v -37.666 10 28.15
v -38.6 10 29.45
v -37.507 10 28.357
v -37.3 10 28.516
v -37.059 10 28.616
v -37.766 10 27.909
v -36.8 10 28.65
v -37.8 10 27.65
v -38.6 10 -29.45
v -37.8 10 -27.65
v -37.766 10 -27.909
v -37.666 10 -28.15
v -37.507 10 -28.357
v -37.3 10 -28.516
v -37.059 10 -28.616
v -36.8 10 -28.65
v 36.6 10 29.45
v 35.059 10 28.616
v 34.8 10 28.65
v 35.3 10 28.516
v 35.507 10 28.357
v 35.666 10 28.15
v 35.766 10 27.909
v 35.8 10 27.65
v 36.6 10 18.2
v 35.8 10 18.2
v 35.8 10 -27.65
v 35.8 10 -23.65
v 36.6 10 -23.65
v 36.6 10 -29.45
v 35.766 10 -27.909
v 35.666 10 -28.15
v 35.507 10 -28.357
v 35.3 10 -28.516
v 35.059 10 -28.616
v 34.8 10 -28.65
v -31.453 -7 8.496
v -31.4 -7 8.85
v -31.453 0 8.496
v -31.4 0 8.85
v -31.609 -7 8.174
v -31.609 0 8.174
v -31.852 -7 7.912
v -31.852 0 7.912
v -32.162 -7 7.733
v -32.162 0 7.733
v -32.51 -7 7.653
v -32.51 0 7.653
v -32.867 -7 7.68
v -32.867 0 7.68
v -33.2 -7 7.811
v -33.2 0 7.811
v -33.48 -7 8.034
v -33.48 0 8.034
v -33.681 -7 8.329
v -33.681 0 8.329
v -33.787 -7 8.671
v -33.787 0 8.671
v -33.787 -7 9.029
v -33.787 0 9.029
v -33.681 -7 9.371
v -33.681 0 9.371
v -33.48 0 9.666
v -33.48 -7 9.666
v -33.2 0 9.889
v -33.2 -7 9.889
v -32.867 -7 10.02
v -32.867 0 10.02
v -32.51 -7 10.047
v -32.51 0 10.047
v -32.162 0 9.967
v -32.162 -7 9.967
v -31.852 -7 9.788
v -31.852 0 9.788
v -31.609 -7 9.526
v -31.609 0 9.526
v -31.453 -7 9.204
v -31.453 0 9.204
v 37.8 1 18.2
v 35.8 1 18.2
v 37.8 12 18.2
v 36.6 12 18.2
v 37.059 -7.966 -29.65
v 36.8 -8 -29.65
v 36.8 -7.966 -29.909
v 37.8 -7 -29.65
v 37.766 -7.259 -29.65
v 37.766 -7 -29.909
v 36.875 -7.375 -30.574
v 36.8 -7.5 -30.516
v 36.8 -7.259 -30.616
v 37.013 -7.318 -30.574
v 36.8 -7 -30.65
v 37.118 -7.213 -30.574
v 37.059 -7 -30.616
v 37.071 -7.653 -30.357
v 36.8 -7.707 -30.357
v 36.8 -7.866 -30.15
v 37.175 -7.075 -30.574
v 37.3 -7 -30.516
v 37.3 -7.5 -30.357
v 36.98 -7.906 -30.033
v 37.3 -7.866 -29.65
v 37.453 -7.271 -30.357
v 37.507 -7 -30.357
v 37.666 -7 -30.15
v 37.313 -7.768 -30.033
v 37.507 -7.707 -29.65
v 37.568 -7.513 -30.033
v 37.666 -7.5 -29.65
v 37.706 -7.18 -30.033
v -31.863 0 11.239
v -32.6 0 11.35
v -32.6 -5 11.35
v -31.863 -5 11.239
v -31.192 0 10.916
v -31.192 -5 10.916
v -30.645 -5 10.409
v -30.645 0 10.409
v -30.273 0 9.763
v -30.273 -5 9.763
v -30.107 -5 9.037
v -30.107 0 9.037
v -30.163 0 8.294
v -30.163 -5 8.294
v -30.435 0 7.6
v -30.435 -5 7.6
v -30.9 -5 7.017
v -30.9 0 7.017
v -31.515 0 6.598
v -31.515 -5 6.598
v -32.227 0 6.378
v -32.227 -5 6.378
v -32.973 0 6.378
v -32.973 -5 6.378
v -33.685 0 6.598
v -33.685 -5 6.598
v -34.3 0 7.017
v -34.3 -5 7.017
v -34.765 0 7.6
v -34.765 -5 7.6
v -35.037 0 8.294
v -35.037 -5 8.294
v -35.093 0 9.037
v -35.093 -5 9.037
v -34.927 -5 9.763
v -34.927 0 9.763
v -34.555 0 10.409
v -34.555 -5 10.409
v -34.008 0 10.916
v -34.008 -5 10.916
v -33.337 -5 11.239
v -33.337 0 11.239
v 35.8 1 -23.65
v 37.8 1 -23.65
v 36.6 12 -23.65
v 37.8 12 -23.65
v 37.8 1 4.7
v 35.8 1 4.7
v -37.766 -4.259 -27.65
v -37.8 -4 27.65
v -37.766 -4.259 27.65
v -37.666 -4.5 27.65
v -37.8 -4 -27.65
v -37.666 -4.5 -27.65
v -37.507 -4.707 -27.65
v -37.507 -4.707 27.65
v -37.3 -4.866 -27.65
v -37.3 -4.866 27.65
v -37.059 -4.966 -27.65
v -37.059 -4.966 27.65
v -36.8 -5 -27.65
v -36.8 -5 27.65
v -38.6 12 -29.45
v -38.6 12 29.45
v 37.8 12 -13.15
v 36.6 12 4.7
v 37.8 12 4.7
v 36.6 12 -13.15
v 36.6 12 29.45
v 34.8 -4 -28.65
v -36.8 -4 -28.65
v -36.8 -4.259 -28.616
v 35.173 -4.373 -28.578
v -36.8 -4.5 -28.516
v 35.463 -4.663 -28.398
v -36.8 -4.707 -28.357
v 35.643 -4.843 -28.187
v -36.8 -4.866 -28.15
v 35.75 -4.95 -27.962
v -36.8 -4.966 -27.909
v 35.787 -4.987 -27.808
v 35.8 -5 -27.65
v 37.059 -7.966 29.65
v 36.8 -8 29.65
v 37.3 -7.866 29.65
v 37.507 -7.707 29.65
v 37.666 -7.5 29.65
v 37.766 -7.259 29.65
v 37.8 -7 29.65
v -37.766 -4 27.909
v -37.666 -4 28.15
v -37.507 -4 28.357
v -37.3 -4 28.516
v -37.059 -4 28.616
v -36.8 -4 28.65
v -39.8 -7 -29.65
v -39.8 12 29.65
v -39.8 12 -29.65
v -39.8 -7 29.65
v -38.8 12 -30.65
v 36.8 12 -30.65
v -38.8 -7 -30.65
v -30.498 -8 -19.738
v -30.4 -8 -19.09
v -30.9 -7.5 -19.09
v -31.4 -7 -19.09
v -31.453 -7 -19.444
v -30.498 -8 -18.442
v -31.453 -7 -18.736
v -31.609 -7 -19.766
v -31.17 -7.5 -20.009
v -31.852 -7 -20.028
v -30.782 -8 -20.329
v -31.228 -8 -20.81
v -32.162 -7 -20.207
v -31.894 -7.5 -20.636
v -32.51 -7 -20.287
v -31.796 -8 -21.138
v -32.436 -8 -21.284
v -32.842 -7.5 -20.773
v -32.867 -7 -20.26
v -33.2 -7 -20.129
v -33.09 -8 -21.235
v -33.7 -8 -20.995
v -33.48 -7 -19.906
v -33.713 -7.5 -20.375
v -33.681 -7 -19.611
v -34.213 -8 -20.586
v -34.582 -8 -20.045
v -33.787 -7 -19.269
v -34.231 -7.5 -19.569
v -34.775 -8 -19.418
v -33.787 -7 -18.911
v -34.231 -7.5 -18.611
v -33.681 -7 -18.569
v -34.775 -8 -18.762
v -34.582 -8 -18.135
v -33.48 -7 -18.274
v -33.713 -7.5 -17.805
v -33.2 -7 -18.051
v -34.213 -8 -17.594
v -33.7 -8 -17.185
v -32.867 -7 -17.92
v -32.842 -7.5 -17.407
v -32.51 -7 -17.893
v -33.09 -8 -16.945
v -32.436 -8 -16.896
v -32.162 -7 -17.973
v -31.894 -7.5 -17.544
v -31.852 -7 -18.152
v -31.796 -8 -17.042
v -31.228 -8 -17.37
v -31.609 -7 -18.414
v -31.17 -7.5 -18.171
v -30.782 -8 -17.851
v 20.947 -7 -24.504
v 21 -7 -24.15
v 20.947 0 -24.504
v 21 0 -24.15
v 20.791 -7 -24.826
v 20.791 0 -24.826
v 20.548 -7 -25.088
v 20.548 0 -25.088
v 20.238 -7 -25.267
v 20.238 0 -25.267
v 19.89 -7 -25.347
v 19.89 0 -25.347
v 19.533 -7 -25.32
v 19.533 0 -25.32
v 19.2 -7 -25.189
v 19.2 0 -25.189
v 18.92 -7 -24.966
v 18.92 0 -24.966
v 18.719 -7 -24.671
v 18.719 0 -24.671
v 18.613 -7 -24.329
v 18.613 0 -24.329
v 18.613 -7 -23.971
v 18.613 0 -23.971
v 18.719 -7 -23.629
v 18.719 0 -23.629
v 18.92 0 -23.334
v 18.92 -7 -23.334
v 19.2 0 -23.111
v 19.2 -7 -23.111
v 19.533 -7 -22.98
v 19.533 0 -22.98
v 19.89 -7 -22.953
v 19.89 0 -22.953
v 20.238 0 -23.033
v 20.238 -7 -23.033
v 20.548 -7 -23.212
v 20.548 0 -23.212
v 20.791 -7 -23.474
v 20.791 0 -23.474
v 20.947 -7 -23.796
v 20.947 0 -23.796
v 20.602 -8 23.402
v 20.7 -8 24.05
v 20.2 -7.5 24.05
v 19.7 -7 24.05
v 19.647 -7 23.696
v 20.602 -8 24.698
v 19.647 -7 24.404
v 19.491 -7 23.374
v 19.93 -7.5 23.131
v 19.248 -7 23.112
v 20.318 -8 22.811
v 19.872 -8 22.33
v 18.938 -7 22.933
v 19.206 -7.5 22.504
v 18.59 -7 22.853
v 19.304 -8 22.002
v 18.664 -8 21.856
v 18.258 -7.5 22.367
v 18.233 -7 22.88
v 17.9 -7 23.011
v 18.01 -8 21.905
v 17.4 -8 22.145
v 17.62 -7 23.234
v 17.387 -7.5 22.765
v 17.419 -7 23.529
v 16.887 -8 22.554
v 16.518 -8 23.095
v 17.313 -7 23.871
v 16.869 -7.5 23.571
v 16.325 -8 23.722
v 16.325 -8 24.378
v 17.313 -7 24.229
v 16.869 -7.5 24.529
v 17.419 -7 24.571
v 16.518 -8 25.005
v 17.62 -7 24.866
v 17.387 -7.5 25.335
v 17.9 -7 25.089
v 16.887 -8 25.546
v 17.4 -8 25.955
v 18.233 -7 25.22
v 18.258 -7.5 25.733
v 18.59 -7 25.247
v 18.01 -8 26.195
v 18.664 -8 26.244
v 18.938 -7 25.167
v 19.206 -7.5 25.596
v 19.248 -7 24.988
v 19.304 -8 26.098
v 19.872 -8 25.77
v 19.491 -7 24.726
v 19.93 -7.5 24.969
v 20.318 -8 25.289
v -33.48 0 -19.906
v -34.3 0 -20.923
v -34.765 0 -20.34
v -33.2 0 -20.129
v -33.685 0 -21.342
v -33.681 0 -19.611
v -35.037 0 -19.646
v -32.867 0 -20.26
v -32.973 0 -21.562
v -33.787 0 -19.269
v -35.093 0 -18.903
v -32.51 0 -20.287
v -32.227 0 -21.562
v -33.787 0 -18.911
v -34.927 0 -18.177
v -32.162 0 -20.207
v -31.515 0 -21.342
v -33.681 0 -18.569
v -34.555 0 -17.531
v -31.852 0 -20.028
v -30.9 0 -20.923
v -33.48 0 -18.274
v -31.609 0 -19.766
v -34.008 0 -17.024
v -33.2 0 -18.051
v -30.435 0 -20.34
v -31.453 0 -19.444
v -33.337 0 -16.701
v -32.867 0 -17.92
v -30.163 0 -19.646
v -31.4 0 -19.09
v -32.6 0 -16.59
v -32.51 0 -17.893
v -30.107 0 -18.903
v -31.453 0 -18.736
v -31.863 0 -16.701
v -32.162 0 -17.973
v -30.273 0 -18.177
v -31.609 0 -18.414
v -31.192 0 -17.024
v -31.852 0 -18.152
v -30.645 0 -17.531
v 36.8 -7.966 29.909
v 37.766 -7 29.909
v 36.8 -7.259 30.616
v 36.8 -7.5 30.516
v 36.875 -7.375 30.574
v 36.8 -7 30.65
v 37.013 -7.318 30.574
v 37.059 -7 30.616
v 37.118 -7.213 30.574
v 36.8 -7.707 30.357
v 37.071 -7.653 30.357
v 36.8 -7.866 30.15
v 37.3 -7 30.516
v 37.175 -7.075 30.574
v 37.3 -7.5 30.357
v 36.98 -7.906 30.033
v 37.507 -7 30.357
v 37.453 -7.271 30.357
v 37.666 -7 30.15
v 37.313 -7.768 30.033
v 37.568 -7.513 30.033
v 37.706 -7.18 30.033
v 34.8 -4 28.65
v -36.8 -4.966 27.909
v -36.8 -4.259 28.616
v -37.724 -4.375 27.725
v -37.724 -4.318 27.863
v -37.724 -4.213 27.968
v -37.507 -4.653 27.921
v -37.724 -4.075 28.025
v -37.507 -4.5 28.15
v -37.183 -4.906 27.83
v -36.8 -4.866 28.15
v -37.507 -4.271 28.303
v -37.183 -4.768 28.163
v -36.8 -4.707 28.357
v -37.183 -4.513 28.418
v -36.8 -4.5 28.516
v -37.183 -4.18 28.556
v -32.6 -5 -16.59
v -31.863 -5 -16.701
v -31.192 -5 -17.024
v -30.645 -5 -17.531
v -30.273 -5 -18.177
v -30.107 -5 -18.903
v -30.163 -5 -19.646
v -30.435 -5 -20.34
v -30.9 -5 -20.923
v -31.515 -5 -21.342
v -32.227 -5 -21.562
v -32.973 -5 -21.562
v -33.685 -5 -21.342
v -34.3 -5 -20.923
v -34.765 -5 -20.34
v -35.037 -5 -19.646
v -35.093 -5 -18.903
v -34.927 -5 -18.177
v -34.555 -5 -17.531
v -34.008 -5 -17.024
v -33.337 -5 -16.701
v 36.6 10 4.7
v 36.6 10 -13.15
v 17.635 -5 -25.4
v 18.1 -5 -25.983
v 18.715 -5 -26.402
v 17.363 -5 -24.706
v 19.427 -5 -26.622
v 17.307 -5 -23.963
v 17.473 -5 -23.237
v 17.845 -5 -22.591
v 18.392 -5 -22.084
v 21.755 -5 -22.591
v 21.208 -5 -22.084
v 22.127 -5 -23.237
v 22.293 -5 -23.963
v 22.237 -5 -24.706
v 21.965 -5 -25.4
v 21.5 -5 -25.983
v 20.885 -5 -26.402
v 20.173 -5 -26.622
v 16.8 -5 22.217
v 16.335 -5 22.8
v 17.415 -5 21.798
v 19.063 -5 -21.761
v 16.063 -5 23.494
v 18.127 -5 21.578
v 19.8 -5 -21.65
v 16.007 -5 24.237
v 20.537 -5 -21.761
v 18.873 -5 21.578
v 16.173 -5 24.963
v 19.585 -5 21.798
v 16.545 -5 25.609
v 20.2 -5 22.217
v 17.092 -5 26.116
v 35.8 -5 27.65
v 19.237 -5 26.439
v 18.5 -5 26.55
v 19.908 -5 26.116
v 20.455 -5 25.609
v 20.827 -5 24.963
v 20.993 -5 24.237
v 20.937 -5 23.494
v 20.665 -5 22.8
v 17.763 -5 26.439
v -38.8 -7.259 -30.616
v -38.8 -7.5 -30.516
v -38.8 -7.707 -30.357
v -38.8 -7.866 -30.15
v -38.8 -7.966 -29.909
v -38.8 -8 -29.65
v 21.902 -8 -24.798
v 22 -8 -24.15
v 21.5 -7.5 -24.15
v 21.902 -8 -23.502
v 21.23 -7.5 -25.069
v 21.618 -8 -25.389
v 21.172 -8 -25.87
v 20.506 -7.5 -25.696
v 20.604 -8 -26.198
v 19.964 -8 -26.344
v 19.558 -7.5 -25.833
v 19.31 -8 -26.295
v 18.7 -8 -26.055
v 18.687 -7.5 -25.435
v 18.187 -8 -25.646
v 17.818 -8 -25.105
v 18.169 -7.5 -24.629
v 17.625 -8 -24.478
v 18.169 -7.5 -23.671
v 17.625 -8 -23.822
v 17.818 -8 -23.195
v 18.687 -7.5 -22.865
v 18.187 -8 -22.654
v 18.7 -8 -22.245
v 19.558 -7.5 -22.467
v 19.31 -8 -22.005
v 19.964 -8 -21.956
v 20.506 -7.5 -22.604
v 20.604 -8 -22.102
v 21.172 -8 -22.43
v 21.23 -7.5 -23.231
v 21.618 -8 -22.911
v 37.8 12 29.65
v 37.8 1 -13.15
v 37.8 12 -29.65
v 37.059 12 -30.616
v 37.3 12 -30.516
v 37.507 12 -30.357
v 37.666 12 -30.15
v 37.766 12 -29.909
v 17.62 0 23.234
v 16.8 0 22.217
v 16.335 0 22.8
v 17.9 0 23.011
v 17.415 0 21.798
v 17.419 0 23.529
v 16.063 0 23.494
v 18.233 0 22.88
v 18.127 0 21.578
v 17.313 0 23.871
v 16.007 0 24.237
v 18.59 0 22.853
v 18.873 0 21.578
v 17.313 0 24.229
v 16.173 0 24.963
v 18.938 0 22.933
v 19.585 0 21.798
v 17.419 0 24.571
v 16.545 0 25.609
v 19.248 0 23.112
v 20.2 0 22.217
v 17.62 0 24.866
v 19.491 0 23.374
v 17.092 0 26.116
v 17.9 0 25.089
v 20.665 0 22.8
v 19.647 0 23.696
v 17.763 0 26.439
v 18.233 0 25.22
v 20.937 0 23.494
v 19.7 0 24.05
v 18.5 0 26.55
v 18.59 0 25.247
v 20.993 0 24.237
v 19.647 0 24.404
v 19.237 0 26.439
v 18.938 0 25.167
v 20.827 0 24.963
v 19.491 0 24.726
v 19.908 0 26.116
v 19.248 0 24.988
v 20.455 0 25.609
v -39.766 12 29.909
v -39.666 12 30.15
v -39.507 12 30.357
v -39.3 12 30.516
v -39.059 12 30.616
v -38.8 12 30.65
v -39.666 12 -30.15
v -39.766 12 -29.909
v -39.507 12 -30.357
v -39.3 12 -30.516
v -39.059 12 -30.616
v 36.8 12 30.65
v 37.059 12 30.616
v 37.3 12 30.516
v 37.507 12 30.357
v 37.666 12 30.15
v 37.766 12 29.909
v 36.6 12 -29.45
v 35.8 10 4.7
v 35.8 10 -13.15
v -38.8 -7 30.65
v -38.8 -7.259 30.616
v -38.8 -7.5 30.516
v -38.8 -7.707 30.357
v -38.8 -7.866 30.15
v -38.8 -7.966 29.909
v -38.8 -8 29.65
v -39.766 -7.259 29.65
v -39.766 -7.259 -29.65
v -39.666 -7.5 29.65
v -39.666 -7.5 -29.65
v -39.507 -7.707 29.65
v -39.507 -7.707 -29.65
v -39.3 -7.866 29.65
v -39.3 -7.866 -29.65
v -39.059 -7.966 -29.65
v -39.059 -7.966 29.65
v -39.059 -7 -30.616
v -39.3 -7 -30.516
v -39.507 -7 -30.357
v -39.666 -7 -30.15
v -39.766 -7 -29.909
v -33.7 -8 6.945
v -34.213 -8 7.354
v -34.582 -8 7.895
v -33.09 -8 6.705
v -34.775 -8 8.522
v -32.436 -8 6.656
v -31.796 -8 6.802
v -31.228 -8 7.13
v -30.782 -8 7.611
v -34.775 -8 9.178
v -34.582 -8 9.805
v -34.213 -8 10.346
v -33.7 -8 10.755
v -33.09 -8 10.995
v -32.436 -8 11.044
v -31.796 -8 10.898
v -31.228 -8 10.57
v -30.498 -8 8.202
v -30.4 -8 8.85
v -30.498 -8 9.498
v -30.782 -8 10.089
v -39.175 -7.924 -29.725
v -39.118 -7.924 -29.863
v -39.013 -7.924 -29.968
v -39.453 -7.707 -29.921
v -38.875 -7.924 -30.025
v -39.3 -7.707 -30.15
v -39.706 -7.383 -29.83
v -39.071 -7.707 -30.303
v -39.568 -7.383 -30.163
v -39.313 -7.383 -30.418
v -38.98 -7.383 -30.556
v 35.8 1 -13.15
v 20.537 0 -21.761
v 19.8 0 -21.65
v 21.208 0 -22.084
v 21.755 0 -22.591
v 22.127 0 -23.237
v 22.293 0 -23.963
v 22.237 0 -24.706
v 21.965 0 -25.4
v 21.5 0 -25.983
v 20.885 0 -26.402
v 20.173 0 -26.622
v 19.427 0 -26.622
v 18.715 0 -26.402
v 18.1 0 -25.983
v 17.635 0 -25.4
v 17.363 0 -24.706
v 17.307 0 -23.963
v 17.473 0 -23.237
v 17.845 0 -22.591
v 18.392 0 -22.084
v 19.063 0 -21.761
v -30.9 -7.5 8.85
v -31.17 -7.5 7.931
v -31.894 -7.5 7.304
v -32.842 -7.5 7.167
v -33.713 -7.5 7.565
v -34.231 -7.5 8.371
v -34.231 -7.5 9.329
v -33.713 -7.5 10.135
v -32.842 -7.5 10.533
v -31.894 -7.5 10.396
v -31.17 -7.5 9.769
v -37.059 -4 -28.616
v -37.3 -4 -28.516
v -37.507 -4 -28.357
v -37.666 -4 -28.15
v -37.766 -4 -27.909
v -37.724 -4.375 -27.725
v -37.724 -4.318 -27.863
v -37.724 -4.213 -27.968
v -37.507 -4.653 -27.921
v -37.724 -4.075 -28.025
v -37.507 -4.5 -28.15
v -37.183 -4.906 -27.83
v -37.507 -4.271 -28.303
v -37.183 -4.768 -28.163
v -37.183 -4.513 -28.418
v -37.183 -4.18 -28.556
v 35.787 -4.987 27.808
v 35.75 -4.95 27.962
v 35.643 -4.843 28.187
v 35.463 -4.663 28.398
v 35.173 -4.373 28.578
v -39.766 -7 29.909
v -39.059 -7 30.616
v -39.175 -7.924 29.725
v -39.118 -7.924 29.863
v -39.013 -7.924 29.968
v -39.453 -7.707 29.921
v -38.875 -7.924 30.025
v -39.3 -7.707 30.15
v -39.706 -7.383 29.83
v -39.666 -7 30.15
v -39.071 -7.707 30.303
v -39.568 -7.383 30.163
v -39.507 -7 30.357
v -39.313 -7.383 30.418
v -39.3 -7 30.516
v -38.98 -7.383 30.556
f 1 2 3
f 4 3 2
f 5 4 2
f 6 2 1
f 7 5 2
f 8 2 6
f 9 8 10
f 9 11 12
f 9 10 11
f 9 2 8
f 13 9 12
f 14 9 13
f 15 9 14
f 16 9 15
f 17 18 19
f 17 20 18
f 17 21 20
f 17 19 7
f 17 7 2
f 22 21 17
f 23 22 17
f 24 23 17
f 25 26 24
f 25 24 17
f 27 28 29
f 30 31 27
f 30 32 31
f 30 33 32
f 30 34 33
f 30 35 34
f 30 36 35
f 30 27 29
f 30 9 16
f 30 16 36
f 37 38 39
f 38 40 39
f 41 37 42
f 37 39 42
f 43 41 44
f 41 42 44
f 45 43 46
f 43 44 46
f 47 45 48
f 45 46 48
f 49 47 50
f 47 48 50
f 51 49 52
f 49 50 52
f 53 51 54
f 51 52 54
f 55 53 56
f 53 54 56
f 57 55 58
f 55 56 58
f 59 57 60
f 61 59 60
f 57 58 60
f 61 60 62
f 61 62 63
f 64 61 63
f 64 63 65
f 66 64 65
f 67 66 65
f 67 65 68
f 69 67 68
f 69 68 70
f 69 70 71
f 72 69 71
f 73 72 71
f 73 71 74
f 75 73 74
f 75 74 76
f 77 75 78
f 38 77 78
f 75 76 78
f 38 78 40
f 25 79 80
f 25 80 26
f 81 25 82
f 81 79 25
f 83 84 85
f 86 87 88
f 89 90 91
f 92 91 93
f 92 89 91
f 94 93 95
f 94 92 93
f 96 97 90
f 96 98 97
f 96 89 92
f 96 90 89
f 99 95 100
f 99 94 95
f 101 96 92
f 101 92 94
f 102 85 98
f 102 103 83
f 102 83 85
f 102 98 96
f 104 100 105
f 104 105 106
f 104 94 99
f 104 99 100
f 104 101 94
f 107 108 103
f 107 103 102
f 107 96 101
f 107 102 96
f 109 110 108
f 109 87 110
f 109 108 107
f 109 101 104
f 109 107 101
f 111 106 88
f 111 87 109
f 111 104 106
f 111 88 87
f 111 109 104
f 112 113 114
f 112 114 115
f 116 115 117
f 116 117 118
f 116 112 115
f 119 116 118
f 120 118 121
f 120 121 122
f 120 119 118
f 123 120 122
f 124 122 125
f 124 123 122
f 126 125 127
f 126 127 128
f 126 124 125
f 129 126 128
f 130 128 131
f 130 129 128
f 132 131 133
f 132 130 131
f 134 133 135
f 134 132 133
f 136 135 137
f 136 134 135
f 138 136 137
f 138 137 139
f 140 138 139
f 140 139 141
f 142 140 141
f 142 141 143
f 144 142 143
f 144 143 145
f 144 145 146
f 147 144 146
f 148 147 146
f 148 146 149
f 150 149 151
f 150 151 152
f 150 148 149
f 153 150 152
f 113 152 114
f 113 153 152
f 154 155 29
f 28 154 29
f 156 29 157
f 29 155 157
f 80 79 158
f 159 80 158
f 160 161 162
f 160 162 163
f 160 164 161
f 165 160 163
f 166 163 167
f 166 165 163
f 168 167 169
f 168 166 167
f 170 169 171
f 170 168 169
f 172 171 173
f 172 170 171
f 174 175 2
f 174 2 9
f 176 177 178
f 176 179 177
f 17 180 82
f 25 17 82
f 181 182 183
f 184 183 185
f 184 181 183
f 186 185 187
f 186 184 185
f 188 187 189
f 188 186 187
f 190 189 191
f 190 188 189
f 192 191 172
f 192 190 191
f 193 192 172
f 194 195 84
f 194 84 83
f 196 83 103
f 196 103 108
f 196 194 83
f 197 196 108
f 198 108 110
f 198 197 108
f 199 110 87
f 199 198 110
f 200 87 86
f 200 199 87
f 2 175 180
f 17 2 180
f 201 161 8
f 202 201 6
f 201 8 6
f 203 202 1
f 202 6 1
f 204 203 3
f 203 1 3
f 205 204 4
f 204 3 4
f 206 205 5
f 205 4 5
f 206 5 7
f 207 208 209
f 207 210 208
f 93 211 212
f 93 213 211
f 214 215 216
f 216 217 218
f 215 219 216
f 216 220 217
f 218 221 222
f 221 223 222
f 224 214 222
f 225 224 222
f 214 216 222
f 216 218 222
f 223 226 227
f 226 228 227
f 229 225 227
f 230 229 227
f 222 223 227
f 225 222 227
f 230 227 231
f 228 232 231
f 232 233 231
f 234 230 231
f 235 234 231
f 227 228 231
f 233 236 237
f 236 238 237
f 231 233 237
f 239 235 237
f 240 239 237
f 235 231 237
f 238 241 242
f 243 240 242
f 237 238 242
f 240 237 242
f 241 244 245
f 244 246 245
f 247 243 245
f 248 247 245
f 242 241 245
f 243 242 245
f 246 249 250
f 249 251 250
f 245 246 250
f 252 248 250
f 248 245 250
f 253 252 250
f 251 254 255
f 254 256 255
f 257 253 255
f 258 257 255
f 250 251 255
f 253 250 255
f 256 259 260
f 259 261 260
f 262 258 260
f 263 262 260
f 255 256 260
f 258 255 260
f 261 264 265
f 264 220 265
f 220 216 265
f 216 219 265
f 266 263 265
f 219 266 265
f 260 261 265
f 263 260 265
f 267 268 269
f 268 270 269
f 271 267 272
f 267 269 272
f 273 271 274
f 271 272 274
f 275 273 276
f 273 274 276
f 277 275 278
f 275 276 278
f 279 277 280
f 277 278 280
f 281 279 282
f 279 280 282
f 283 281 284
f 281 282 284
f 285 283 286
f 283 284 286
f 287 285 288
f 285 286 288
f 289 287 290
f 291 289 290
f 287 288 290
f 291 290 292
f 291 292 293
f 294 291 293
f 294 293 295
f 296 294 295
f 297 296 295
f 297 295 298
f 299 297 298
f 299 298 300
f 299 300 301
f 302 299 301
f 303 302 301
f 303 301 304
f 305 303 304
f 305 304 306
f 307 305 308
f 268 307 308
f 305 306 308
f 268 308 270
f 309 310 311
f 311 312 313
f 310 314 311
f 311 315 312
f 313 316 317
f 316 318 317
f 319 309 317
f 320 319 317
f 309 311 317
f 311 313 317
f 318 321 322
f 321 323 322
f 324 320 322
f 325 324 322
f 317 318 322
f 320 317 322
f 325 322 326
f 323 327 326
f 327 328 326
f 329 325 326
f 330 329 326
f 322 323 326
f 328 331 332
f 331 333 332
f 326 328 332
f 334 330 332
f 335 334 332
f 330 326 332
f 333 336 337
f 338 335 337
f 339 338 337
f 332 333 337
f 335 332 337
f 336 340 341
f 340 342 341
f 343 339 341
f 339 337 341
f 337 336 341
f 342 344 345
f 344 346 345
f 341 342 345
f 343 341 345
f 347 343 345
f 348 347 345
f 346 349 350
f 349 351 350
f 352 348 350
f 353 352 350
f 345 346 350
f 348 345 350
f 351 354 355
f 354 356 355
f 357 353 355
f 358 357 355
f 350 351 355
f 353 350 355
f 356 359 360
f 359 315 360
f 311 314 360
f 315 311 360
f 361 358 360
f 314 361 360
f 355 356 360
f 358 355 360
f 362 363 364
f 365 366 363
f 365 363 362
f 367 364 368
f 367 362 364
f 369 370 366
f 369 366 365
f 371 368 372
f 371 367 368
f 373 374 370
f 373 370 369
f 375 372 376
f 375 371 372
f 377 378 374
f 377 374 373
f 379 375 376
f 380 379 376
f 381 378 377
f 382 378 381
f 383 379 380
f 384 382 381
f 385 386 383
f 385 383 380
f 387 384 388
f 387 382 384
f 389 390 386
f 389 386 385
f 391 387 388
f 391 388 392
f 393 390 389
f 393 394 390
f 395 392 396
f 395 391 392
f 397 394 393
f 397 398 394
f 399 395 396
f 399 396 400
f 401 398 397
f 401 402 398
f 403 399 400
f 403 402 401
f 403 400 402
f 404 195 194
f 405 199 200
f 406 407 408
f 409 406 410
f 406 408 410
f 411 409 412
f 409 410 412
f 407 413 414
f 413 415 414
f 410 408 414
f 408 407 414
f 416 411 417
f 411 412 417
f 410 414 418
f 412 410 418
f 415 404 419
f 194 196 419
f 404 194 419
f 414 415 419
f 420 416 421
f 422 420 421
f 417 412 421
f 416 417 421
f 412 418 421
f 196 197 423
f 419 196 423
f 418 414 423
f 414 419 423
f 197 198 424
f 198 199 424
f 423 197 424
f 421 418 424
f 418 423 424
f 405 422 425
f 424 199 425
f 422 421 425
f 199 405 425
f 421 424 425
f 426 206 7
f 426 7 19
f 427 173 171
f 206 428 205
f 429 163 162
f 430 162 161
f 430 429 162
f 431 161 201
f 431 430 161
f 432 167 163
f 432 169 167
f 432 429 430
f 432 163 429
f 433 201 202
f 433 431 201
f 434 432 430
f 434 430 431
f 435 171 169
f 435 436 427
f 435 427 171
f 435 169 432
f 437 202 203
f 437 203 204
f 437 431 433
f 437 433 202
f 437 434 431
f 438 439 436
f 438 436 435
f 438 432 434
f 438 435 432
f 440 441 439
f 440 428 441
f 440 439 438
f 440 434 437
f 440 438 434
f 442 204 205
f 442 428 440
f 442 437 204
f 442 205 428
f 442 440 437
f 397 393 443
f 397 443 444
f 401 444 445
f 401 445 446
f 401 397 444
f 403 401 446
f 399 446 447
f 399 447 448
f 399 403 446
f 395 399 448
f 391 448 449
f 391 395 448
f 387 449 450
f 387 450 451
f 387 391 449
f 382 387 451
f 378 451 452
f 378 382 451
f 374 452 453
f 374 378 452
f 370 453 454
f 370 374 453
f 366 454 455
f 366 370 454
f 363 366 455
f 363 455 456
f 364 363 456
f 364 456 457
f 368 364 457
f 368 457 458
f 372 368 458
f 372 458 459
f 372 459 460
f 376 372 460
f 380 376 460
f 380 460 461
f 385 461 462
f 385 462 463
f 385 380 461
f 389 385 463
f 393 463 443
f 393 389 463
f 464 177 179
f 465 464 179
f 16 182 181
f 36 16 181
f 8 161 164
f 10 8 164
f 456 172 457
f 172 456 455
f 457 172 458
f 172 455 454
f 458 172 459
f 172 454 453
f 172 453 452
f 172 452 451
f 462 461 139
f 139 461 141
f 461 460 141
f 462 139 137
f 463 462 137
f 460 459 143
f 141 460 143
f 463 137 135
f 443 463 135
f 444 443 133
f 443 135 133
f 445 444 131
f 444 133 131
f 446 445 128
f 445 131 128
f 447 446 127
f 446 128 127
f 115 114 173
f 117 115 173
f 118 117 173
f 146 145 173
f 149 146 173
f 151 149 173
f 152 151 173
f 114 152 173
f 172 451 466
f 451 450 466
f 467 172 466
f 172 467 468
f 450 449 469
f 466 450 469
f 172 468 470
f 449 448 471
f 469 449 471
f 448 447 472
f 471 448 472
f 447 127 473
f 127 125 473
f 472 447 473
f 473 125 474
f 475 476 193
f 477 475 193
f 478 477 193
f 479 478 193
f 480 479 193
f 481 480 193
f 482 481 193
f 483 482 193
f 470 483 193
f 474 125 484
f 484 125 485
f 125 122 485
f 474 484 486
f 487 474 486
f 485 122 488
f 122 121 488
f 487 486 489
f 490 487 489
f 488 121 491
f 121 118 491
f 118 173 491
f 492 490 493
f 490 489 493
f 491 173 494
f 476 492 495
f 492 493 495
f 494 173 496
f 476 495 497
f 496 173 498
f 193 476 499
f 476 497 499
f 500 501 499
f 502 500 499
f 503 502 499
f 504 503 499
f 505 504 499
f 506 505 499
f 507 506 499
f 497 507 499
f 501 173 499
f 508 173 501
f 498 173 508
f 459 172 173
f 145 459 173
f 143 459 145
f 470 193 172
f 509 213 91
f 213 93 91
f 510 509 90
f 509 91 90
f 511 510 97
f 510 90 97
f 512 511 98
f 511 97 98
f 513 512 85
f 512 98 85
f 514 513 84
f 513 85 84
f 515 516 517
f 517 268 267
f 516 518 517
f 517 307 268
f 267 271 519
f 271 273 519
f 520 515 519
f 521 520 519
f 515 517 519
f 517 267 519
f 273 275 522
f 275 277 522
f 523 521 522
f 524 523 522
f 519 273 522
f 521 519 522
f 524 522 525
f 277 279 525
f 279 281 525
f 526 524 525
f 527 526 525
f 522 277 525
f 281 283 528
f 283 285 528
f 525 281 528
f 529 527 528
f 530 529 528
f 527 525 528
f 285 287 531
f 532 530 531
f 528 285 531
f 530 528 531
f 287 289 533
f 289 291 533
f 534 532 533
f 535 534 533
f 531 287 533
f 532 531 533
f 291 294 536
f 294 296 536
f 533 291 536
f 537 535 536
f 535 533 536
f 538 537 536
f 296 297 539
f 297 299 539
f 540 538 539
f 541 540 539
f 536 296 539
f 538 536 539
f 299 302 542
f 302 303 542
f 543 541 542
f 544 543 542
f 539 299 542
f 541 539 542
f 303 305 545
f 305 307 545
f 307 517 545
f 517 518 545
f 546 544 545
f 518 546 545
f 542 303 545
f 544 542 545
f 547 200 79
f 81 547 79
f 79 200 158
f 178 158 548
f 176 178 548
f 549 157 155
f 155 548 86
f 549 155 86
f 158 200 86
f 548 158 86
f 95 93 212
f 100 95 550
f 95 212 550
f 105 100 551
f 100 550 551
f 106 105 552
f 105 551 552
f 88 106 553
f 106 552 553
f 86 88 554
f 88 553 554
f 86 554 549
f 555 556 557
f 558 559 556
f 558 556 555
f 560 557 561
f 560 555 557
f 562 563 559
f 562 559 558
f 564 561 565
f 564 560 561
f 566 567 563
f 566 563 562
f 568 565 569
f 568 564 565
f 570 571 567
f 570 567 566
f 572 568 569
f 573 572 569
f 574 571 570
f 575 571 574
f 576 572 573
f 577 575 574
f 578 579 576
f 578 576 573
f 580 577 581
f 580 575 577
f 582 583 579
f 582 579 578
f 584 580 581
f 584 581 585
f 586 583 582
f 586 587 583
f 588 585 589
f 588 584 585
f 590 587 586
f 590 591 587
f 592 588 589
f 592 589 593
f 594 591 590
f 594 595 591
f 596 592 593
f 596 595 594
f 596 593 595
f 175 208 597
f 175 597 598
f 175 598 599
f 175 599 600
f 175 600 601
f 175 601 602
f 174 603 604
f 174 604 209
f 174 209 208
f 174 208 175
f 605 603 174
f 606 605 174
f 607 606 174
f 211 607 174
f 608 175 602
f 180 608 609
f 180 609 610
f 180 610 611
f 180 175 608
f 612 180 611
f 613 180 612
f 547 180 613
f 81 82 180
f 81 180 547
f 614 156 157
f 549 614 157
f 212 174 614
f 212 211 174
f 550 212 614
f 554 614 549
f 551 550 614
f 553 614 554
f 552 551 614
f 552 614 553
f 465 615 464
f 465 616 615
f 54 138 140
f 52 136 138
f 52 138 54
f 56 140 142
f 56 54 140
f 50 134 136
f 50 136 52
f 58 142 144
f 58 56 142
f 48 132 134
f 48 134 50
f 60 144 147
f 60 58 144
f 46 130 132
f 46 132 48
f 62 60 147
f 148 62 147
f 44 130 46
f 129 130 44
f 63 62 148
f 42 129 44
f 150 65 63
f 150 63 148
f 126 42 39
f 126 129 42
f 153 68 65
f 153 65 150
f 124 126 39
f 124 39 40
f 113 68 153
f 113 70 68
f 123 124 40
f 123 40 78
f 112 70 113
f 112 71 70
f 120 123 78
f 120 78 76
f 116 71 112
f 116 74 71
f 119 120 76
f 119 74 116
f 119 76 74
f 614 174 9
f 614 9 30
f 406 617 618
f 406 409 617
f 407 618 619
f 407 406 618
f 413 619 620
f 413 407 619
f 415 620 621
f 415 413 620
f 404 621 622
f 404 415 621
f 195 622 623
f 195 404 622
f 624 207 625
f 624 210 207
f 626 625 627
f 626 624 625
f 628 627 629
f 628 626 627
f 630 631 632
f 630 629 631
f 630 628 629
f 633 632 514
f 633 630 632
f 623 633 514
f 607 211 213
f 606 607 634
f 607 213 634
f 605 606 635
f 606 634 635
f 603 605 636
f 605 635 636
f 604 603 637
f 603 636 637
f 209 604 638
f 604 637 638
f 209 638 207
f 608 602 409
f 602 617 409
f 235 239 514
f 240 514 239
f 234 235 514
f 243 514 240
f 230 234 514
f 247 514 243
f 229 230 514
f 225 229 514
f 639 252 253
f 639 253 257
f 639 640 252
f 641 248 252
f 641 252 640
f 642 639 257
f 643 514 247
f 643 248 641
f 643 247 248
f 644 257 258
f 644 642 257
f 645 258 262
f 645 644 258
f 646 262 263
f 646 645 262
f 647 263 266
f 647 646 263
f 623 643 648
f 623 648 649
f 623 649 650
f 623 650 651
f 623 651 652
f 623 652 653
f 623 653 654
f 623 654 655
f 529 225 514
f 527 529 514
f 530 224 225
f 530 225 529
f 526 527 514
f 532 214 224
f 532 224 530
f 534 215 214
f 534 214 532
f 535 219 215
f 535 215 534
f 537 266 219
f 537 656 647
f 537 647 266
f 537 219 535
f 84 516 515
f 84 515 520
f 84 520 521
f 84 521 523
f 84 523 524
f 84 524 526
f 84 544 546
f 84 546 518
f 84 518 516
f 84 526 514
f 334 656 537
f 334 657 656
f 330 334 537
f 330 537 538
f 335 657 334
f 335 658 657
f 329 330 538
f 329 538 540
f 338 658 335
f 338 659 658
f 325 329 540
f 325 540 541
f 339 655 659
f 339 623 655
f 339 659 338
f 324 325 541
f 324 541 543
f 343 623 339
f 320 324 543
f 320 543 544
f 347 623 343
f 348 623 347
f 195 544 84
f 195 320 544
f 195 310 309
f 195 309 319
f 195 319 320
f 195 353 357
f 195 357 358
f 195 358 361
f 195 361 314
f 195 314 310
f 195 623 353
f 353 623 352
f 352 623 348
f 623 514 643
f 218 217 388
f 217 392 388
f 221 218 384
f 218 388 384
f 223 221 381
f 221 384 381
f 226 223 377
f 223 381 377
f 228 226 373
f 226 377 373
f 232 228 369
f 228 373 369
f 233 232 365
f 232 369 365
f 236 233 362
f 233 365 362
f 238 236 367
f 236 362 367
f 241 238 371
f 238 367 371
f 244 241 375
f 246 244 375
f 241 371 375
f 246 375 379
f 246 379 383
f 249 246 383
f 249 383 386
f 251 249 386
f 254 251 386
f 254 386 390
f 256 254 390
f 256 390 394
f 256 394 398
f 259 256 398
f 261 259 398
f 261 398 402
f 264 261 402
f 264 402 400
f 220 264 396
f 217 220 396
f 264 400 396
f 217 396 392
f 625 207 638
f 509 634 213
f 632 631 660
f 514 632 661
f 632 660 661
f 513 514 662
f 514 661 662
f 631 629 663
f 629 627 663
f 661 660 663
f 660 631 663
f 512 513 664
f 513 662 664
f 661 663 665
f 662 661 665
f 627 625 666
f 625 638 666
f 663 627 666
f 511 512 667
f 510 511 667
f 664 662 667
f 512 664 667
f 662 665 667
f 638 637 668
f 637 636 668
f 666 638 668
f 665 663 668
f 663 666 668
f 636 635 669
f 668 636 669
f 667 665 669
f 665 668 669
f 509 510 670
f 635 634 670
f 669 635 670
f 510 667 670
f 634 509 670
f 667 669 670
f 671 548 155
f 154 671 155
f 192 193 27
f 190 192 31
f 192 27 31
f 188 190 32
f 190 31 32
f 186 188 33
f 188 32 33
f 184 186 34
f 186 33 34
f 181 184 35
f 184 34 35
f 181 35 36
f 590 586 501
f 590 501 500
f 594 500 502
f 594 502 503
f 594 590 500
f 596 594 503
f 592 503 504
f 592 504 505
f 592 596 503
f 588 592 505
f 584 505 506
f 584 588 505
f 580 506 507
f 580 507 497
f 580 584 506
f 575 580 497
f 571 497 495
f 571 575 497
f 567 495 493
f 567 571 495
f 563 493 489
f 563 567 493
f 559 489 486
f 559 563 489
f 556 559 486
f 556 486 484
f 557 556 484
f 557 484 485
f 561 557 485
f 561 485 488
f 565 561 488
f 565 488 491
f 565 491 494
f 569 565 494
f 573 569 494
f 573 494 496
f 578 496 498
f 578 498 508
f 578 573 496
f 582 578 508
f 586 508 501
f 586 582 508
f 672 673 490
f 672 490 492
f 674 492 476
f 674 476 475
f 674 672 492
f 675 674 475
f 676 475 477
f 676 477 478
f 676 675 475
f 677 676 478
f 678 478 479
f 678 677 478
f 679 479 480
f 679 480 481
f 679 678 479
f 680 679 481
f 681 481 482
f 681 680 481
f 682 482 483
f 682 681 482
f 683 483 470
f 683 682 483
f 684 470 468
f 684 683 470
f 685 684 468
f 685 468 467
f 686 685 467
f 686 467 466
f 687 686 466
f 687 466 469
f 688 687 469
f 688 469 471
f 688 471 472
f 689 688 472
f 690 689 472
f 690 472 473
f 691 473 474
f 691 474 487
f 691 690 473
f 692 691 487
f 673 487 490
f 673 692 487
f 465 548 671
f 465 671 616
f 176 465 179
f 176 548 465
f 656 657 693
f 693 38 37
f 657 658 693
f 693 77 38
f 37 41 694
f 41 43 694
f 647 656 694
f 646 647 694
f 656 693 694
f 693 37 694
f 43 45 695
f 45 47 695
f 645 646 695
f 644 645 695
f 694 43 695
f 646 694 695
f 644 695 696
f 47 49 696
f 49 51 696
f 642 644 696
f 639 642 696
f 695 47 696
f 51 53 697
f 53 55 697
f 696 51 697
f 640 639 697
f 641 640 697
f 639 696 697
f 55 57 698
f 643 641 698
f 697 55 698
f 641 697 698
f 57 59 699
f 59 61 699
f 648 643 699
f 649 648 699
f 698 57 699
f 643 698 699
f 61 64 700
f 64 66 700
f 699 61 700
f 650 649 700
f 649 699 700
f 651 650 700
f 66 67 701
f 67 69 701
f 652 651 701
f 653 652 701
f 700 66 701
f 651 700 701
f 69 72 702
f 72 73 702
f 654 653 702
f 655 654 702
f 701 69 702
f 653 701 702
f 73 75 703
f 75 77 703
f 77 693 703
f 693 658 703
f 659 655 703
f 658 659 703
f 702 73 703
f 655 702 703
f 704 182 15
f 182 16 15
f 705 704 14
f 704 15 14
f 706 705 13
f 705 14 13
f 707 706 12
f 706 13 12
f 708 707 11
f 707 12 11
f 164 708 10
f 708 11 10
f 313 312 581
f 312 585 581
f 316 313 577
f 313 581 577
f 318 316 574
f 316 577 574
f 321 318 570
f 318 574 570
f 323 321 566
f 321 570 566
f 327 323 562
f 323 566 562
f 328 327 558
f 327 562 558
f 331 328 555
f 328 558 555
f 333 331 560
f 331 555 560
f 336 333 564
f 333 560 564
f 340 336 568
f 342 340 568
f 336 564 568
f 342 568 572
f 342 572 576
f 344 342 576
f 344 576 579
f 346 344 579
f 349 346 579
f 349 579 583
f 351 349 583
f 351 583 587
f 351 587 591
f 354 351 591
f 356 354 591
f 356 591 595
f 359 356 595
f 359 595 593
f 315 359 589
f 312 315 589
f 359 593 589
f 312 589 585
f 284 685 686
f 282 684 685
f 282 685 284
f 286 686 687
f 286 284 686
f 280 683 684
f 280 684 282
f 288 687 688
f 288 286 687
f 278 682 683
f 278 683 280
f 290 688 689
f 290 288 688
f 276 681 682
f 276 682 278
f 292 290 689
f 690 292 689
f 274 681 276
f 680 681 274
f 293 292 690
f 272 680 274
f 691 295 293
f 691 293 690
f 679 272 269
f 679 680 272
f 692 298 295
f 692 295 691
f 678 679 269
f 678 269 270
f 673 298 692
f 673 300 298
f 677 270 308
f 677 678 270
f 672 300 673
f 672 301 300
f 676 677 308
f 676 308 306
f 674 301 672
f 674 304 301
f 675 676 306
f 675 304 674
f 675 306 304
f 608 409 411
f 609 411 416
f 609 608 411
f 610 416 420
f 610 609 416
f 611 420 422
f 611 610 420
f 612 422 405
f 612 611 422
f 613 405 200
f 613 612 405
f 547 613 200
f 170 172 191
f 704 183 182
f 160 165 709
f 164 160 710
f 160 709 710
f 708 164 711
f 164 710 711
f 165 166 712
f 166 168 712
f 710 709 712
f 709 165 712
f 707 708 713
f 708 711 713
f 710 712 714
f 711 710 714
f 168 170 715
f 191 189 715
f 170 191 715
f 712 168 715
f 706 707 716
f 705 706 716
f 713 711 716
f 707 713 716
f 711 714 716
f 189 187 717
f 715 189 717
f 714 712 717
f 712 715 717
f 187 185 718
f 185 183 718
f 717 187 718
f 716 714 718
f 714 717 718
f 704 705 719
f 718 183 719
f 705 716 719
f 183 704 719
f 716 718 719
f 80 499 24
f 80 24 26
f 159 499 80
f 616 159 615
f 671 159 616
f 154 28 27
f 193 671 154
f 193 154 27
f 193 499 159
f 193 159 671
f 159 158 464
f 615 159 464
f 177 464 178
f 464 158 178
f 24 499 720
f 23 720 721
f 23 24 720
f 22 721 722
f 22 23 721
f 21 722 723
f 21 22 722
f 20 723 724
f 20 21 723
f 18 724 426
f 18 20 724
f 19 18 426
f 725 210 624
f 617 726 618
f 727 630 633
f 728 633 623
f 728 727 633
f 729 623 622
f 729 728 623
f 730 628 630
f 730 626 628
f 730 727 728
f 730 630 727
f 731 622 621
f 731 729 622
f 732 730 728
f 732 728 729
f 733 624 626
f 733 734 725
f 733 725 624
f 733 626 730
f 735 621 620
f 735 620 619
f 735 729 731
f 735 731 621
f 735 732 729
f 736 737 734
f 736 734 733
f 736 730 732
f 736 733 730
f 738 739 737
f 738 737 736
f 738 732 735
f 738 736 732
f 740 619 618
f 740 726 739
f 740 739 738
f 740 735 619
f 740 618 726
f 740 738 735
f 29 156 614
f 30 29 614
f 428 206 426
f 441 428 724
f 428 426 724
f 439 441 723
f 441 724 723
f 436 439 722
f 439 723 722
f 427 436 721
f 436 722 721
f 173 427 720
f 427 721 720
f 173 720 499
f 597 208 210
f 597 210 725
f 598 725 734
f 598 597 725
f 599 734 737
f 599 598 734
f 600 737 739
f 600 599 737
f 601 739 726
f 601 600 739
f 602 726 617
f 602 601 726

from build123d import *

# Parameters (mm, degrees)
SKETCH1_R                                       = 2.5
BOSS_EXTRUDE1_DEPTH                             = 5
BOSS_EXTRUDE1_2_DEPTH                           = 5
BOSS_EXTRUDE1_3_DEPTH                           = 5
BOSS_EXTRUDE1_4_DEPTH                           = 5
SKETCH3_W                                       = 77.6
SKETCH3_H                                       = 61.3
BOSS_EXTRUDE2_DEPTH                             = 3
SKETCH4_W                                       = 77.6
SKETCH4_H                                       = 61.3
SKETCH4_W_2                                     = 73.6
SKETCH4_H_2                                     = 57.3
BOSS_EXTRUDE3_DEPTH                             = 17
CUT_EXTRUDE2_REACH                              = 86.292
SKETCH5_W                                       = 13.5
SKETCH5_H                                       = 11
SKETCH5_W_2                                     = 10.5
FILLET1_R                                       = 1
FILLET2_R                                       = 1
SKETCH7_W                                       = 75.2
SKETCH7_H                                       = 58.9
CUT_EXTRUDE3_DEPTH                              = 2
SKETCH2_R                                       = 1
CUT_EXTRUDE1_DEPTH                              = 52.647482998
CSK_FOR_M2_FLAT_HEAD_MACHINE_SCREW1_D           = 2.4
CSK_FOR_M2_FLAT_HEAD_MACHINE_SCREW1_CSINK_D     = 4.4
CSK_FOR_M2_FLAT_HEAD_MACHINE_SCREW1_CSINK_ANGLE = 90


with BuildPart() as part:
    # Sketch1 → Boss-Extrude1 (new body)
    with BuildSketch(Plane(origin=(0, 0, 0), x_dir=(1, 0, 0), z_dir=(0, 1, 0))):
        with Locations(Location((-32.6, 19.09, 0), (0, 0, 270))):
            Circle(SKETCH1_R)
    extrude(amount=-BOSS_EXTRUDE1_DEPTH)



with BuildPart() as body_2:
    # Sketch1 → Boss-Extrude1 2 (new body)
    with BuildSketch(Plane(origin=(0, 0, 0), x_dir=(1, 0, 0), z_dir=(0, 1, 0))):
        with Locations(Location((-32.6, -8.85, 0), (0, 0, 270))):
            Circle(SKETCH1_R)
    extrude(amount=-BOSS_EXTRUDE1_2_DEPTH)


with BuildPart() as body_3:
    # Sketch1 → Boss-Extrude1 3 (new body)
    with BuildSketch(Plane(origin=(0, 0, 0), x_dir=(1, 0, 0), z_dir=(0, 1, 0))):
        with Locations(Location((19.8, 24.15, 0), (0, 0, 270))):
            Circle(SKETCH1_R)
    extrude(amount=-BOSS_EXTRUDE1_3_DEPTH)


with BuildPart() as body_4:
    # Sketch1 → Boss-Extrude1 4 (new body)
    with BuildSketch(Plane(origin=(0, 0, 0), x_dir=(1, 0, 0), z_dir=(0, 1, 0))):
        with Locations(Location((18.5, -24.05, 0), (0, 0, 270))):
            Circle(SKETCH1_R)
    extrude(amount=-BOSS_EXTRUDE1_4_DEPTH)


with BuildPart() as part_1:
    add(part.part)

    add(body_2.part)  # Boss-Extrude2 merges body 2

    add(body_3.part)  # Boss-Extrude2 merges body 3

    add(body_4.part)  # Boss-Extrude2 merges body 4
    # Sketch3 → Boss-Extrude2 (add)
    with BuildSketch(Plane.XZ.offset(5)):
        with Locations((-1, 0)):
            Rectangle(SKETCH3_W, SKETCH3_H)
    extrude(amount=BOSS_EXTRUDE2_DEPTH)

    # Sketch4 → Boss-Extrude3 (add)
    with BuildSketch(Plane(origin=(0, -5, 0), x_dir=(1, 0, 0), z_dir=(0, 1, 0))):
        with Locations((-1, 0)):
            Rectangle(SKETCH4_W, SKETCH4_H)
        with Locations((-1, 0)):
            Rectangle(SKETCH4_W_2, SKETCH4_H_2, mode=Mode.SUBTRACT)
    extrude(amount=BOSS_EXTRUDE3_DEPTH)

    # Sketch5 → Cut-Extrude2 (cut, up to next)
    with BuildSketch(Plane(origin=(37.8, 0, 0), x_dir=(0, 0, -1), z_dir=(1, 0, 0)), mode=Mode.PRIVATE) as cut_extrude2_sk1:
        with Locations((-11.45, 6.5)):
            Rectangle(SKETCH5_W, SKETCH5_H)
    cut_extrude2_tool1 = extrude(cut_extrude2_sk1.sketch, amount=-CUT_EXTRUDE2_REACH, mode=Mode.PRIVATE) & part_1.part
    # Sketch5 → Cut-Extrude2 (cut, up to next)
    with BuildSketch(Plane(origin=(37.8, 0, 0), x_dir=(0, 0, -1), z_dir=(1, 0, 0)), mode=Mode.PRIVATE) as cut_extrude2_sk2:
        with Locations((18.4, 6.5)):
            Rectangle(SKETCH5_W_2, SKETCH5_H)
    cut_extrude2_tool2 = extrude(cut_extrude2_sk2.sketch, amount=-CUT_EXTRUDE2_REACH, mode=Mode.PRIVATE) & part_1.part
    add(cut_extrude2_tool1.solids().sort_by_distance((37.8, 6.5, 11.45))[0], mode=Mode.SUBTRACT)
    add(cut_extrude2_tool2.solids().sort_by_distance((37.8, 6.5, -18.4))[0], mode=Mode.SUBTRACT)

    # Fillet1
    fillet1_edges = [part_1.edges().sort_by_distance(p)[0] for p in [
        (-1, -5, 28.65),
        (-1, -5, -28.65),
        (-37.8, -5, 0),
        (35.8, 3.5, -28.65),
        (-37.8, 3.5, -28.65),
        (-37.8, 3.5, 28.65),
        (35.8, 3.5, 28.65),
        (37.8, -8, 0),
    ]]
    fillet(fillet1_edges, radius=FILLET1_R)

    # Fillet2
    fillet2_edges = [part_1.edges().sort_by_distance(p)[0] for p in [
        (-39.8, 2, 30.65),
        (-39.8, 2, -30.65),
        (-39.8, -8, 0),
        (-1.5, -8, -30.65),
        (-1.5, -8, 30.65),
        (37.8, 2.5, 30.65),
        (37.507106781, -7.707106781, 30.65),
        (37.8, 2.5, -30.65),
        (37.507106781, -7.707106781, -30.65),
    ]]
    fillet(fillet2_edges, radius=FILLET2_R)

    # Sketch7 → Cut-Extrude3 (cut)
    with BuildSketch(Plane(origin=(0, 12, 0), x_dir=(1, 0, 0), z_dir=(0, 1, 0))):
        with Locations((-1, 0)):
            Rectangle(SKETCH7_W, SKETCH7_H)
    extrude(amount=-CUT_EXTRUDE3_DEPTH, mode=Mode.SUBTRACT)

    # Sketch2 → Cut-Extrude1 (cut, through all)
    with BuildSketch(Plane(origin=(0, 0, 0), x_dir=(1, 0, 0), z_dir=(0, 1, 0))):
        with Locations(Location((-32.6, -8.85, 0), (0, 0, 270))):
            Circle(SKETCH2_R)
        with Locations(Location((-32.6, 19.09, 0), (0, 0, 270))):
            Circle(SKETCH2_R)
        with Locations(Location((19.8, 24.15, 0), (0, 0, 270))):
            Circle(SKETCH2_R)
        with Locations(Location((18.5, -24.05, 0), (0, 0, 270))):
            Circle(SKETCH2_R)
    extrude(amount=-CUT_EXTRUDE1_DEPTH, mode=Mode.SUBTRACT)

    # CSK for M2 Flat Head Machine Screw1 (through all)
    with Locations(Plane(origin=(0, -8, 0), x_dir=(-1, 0, 0), z_dir=(0, -1, 0))):
        with Locations((32.6, 19.09), (32.6, -8.85), (-18.5, -24.05), (-19.8, 24.15)):
            CounterSinkHole(CSK_FOR_M2_FLAT_HEAD_MACHINE_SCREW1_D / 2, CSK_FOR_M2_FLAT_HEAD_MACHINE_SCREW1_CSINK_D / 2, counter_sink_angle=CSK_FOR_M2_FLAT_HEAD_MACHINE_SCREW1_CSINK_ANGLE)


solid = part_1.part
